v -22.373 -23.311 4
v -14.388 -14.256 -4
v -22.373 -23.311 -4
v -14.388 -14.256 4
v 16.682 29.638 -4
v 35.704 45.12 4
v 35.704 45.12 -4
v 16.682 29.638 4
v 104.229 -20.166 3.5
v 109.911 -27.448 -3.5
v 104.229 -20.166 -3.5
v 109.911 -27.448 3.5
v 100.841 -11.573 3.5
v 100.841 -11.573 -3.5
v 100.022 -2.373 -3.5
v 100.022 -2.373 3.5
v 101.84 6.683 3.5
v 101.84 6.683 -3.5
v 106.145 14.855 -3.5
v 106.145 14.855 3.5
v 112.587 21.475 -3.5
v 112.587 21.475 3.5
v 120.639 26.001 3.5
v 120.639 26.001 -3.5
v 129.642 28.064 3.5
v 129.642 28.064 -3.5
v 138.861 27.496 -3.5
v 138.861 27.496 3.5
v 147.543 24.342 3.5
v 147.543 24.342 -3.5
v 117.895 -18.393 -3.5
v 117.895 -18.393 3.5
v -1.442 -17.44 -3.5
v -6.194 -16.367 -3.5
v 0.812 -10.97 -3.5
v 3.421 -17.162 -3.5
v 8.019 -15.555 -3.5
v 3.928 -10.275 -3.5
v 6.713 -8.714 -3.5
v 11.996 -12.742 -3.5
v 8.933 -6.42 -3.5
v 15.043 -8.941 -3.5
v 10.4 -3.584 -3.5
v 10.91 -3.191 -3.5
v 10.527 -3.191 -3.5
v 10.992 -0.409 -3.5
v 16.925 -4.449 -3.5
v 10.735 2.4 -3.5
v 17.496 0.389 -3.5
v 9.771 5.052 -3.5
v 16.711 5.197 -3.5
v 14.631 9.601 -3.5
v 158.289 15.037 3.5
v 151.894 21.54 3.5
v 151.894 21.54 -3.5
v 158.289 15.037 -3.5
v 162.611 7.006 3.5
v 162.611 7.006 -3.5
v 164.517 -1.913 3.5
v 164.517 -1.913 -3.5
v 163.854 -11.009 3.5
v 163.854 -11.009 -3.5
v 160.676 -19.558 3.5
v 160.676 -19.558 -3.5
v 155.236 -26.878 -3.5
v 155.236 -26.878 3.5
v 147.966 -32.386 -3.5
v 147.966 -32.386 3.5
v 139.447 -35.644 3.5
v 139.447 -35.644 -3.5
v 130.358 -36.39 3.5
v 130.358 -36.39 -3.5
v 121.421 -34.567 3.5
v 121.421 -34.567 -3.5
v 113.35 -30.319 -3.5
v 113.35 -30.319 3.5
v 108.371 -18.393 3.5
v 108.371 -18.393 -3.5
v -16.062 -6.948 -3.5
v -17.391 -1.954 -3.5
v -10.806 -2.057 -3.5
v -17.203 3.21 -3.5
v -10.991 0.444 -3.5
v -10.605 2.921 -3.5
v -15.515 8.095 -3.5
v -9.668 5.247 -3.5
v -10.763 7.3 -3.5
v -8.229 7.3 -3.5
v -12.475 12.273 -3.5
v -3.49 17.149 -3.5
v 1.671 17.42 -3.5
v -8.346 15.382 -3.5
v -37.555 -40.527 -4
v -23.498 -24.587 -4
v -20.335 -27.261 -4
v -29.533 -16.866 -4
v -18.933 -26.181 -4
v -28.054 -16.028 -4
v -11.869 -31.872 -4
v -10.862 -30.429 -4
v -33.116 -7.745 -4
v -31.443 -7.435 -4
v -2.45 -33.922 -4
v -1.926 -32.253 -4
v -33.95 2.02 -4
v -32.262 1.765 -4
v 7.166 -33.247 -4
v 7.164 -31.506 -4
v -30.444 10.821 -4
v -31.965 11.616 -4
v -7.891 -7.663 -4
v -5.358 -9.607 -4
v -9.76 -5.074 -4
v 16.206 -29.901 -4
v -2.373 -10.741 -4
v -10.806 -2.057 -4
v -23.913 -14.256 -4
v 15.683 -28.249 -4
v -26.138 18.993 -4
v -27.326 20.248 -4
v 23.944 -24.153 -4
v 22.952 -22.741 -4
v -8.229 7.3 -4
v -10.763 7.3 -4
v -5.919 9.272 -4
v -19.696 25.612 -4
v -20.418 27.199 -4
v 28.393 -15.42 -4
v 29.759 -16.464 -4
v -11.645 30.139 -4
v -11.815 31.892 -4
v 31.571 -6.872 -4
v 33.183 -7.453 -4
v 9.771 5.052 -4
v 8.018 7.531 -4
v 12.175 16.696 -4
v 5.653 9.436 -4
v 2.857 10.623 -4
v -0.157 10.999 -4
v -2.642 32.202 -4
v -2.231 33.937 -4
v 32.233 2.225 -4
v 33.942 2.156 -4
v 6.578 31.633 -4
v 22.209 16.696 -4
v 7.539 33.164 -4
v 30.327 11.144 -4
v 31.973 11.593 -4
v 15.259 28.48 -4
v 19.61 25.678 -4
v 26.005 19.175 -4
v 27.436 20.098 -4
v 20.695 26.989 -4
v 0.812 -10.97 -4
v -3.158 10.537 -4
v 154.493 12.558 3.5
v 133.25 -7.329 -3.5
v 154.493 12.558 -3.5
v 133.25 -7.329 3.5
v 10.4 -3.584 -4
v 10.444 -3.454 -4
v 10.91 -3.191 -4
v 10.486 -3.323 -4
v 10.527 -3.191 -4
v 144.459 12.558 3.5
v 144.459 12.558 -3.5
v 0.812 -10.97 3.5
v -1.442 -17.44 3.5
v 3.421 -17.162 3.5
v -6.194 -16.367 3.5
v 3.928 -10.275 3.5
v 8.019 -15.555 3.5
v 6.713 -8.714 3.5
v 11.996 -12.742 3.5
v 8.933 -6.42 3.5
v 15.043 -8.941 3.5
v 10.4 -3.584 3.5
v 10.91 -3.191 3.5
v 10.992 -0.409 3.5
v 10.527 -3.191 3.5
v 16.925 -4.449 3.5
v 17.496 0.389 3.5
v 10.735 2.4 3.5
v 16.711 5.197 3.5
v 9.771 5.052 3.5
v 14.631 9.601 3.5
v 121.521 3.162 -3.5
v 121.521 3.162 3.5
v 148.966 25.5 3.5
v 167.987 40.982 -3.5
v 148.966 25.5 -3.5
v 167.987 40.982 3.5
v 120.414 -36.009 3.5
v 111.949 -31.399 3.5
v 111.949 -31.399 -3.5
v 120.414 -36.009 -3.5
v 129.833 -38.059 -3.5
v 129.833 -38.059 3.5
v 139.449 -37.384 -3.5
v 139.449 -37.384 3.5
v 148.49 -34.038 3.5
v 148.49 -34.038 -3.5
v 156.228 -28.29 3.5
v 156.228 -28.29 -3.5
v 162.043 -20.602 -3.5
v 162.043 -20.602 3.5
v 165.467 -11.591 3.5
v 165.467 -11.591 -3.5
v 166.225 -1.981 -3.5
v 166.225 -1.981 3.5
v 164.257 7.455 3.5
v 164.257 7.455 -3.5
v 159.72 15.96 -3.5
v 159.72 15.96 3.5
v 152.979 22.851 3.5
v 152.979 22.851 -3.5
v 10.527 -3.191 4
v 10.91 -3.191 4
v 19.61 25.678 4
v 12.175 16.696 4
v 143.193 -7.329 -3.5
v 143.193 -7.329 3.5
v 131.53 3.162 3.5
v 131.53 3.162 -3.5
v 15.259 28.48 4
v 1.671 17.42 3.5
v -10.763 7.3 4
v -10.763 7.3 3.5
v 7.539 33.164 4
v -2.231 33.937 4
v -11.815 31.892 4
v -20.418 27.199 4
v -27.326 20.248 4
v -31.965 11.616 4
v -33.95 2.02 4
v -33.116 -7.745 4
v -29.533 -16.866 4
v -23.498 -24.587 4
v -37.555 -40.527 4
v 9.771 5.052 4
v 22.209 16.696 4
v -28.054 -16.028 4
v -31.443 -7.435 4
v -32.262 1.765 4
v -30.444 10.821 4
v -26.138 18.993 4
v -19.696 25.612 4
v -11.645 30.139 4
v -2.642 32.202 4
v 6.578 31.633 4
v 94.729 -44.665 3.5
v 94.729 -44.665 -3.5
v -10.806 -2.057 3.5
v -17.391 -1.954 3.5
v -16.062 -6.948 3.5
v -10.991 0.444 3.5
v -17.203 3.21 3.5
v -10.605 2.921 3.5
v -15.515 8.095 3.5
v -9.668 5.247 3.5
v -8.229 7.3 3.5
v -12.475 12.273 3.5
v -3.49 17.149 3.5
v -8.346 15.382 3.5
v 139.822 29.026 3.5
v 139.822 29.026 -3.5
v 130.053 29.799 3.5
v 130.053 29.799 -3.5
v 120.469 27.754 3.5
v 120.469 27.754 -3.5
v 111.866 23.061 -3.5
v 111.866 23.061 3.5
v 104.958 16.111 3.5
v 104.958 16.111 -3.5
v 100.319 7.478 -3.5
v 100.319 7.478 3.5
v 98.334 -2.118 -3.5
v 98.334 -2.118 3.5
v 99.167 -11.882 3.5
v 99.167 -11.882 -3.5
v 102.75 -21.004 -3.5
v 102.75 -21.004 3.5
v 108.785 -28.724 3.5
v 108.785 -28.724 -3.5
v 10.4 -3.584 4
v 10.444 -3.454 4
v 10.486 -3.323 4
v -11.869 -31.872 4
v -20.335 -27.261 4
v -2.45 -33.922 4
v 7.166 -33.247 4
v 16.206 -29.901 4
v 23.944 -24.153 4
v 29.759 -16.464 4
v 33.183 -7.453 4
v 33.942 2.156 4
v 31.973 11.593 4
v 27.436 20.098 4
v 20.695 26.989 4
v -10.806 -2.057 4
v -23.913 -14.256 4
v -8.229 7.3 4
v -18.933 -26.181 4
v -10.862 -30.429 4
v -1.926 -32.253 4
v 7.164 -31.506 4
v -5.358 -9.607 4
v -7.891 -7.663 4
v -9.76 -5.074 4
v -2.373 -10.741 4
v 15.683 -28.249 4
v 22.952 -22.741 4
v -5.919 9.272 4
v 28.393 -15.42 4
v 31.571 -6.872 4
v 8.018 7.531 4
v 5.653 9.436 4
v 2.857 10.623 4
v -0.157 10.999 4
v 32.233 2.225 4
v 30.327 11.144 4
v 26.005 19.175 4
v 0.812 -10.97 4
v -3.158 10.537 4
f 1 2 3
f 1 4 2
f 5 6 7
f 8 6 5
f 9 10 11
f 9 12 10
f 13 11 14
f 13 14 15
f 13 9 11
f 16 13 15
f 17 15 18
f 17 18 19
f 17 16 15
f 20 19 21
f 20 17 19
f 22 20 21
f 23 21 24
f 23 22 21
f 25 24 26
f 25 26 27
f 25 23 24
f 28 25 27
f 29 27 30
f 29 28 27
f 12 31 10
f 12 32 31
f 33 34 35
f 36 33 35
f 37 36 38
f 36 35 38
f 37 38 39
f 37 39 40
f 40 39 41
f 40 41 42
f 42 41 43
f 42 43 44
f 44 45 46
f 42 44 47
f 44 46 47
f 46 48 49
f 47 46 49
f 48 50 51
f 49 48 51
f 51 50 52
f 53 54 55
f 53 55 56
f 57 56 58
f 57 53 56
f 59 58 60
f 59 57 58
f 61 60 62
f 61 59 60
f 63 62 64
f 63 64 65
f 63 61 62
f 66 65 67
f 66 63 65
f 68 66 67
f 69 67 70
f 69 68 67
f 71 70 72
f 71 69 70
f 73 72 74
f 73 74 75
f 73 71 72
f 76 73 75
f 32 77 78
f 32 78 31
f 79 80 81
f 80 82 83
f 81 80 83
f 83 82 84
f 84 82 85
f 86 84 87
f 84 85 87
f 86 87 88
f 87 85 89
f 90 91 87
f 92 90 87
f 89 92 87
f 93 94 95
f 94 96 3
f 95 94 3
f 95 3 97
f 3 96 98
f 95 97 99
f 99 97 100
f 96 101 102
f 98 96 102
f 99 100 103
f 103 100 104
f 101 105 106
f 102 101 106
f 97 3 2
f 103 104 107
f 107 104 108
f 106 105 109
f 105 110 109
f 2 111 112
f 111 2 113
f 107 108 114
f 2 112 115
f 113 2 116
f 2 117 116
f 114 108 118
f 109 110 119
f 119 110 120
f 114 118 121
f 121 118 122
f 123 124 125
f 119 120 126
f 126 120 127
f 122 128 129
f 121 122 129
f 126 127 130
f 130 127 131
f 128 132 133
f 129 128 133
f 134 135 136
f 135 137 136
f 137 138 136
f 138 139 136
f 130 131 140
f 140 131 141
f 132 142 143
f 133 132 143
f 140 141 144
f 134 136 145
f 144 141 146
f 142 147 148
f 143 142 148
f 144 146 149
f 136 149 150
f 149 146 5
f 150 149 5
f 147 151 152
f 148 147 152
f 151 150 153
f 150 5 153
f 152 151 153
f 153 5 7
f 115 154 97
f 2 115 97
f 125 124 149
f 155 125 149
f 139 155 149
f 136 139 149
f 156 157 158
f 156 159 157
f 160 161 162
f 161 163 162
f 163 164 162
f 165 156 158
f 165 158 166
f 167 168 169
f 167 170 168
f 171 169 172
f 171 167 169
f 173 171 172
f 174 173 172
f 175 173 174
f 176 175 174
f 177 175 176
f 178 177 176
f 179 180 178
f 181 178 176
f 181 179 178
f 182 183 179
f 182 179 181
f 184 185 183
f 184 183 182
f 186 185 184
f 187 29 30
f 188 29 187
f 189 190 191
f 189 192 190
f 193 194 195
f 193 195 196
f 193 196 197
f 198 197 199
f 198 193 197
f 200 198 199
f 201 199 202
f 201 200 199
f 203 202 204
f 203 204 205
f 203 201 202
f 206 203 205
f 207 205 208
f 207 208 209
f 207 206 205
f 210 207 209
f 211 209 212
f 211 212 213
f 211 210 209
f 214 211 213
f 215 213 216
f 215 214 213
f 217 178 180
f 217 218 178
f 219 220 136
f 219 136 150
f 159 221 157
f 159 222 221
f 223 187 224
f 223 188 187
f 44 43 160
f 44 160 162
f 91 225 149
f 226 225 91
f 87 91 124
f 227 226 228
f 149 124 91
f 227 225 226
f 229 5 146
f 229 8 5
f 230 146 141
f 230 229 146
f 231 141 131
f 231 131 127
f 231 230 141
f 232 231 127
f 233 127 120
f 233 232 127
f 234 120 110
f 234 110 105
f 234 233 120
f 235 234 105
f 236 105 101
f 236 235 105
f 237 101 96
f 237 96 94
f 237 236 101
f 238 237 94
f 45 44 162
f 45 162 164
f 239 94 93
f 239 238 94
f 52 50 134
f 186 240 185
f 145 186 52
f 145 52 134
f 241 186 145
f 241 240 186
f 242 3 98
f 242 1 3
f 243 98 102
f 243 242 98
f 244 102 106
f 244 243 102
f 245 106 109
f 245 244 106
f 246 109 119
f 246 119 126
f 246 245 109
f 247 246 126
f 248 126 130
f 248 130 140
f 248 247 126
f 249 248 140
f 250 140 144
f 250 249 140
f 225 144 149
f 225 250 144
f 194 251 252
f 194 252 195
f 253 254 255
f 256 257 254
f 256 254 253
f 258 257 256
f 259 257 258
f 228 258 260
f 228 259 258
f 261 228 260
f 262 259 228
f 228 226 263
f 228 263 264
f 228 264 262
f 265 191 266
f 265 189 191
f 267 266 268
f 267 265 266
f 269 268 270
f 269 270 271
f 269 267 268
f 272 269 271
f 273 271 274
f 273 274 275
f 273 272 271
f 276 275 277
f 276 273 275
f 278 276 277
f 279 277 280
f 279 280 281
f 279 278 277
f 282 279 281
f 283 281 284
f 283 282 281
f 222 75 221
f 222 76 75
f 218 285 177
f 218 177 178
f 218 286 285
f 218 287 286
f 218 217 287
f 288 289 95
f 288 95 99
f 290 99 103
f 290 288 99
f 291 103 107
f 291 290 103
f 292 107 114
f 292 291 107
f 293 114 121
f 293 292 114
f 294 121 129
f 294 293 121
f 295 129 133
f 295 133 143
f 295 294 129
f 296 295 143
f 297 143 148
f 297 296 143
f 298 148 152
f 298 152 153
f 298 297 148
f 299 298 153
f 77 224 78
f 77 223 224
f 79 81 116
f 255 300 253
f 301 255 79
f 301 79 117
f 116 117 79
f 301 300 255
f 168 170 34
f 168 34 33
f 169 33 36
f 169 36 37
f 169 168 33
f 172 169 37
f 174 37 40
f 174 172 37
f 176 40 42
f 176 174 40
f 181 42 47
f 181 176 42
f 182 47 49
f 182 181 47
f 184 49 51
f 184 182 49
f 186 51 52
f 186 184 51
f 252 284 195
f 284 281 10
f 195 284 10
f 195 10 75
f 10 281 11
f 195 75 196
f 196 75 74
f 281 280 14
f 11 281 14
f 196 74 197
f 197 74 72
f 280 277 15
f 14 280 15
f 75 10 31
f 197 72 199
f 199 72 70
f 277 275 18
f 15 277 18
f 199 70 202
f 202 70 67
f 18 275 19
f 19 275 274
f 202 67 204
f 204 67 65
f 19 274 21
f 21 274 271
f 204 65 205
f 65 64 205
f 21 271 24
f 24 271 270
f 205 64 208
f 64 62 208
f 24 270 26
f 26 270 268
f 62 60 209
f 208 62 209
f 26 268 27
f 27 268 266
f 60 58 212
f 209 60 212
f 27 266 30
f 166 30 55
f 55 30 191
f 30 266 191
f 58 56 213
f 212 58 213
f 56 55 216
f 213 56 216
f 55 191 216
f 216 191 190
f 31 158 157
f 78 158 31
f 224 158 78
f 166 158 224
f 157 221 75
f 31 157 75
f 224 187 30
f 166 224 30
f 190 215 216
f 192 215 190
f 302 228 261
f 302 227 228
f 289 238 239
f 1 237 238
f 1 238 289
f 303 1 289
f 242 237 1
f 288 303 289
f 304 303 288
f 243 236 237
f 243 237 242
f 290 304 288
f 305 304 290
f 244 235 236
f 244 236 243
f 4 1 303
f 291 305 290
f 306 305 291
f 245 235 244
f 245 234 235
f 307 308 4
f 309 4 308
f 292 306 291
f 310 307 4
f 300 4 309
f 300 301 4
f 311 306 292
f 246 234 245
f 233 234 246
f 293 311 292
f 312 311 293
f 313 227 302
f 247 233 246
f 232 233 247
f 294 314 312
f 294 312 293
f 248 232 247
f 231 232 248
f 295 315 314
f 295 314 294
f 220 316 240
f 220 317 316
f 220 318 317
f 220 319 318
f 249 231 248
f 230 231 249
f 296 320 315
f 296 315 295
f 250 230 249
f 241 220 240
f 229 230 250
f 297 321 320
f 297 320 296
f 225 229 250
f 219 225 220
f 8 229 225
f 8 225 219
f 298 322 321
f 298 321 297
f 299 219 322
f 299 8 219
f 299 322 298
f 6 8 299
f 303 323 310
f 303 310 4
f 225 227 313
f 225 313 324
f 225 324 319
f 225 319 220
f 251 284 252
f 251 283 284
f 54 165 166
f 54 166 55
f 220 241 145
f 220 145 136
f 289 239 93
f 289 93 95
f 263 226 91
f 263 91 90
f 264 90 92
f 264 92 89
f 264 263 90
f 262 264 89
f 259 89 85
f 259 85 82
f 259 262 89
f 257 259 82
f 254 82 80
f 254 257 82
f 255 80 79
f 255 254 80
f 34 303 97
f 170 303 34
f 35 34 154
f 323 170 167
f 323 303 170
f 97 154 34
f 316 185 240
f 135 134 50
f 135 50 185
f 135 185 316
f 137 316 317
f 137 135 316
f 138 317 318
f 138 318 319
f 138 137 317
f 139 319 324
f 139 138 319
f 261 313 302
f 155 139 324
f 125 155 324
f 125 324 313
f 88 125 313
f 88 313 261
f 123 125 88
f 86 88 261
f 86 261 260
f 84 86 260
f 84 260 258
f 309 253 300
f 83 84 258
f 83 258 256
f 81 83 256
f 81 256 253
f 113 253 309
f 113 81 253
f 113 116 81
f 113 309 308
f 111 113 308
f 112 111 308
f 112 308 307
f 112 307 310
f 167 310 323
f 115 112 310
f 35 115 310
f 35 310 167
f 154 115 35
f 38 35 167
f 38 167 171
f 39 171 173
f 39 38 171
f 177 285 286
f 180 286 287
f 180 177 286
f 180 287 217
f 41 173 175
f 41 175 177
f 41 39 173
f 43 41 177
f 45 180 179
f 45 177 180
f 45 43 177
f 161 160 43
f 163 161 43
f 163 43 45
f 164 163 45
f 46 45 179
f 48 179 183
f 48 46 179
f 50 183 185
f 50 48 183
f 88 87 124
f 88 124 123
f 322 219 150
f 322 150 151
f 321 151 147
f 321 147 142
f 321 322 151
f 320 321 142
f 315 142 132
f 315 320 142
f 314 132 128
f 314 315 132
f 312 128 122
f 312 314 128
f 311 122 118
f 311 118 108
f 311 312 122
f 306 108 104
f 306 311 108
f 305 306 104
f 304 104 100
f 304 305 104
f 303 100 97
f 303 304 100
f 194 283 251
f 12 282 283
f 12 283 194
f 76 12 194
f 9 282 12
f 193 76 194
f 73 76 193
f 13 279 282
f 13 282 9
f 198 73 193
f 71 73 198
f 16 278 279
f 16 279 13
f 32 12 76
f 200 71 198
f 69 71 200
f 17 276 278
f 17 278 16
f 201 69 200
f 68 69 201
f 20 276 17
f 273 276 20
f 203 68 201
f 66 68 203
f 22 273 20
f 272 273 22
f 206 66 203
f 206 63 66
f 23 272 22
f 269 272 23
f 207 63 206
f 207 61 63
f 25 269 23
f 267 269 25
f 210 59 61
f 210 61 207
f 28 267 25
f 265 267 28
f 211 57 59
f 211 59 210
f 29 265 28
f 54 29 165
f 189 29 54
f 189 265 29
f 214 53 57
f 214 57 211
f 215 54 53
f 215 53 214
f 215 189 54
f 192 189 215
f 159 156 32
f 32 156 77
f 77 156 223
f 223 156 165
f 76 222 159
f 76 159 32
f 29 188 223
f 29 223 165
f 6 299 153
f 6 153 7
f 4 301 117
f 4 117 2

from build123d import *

# Parameters (mm, degrees)
F1_DEPTH = 4
F3_DEPTH = 3.5
F0_R     = 17.5
F0_R_2   = 11
F4_DEPTH = 12.5


with BuildPart() as f1:
    # F0 (on Top) → F1 (new body, symmetric)
    with BuildSketch(Plane.XY):
        with BuildLine():
            Line((108.7852449225, -28.7244588639), (94.7288274765, -44.6647256613))
            Line((94.7288274765, -44.6647256613), (111.948788965, -31.3989787612))
            ThreePointArc((111.948788965, -31.3989787612), (159.4091762592, -24.6532280154), (152.9788344756, 22.8509214853))
            Line((152.9788344756, 22.8509214853), (167.9873764515, 40.9821607172))
            Line((167.9873764515, 40.9821607172), (148.9655762499, 25.4999380126))
            ThreePointArc((148.9655762499, 25.4999380126), (104.9580490458, 16.1105279599), (108.7852449225, -28.7244588639))
        make_face()
        with BuildLine():
            Line((154.493033886, 12.5583419576), (144.4589197636, 12.5583419576))
            Line((144.4589197636, 12.5583419576), (151.894032038, 21.5404136059))
            ThreePointArc((151.894032038, 21.5404136059), (158.2156540419, -23.4112108102), (113.3504015781, -30.3192180319))
            Line((113.3504015781, -30.3192180319), (143.1933492422, -7.3290974833))
            Line((143.1933492422, -7.3290974833), (133.2496255636, -7.3290974833))
            Line((133.2496255636, -7.3290974833), (154.493033886, 12.5583419576))
        make_face(mode=Mode.SUBTRACT)
        with BuildLine():
            Line((108.3709695976, -18.3933340013), (117.8954188988, -18.3933340013))
            Line((117.8954188988, -18.3933340013), (109.910569413, -27.4483177218))
            ThreePointArc((109.910569413, -27.4483177218), (106.1453531249, 14.8550560972), (147.5428330502, 24.3419389359))
            Line((147.5428330502, 24.3419389359), (121.5210035443, 3.1622527167))
            Line((121.5210035443, 3.1622527167), (131.5303295851, 3.1622527167))
            Line((131.5303295851, 3.1622527167), (108.3709695976, -18.3933340013))
        make_face(mode=Mode.SUBTRACT)
    extrude(amount=F1_DEPTH, both=True)


with BuildPart() as f1_1:
    # F2: moved
    add(f1.part.moved(Location((-132.2836276846, 4.137752642, 0))))

    # F0 (on Top) → F3, piece 2 (join, symmetric)
    with BuildSketch(Plane.XY):
        Circle(F0_R)
        Circle(F0_R_2, mode=Mode.SUBTRACT)
    extrude(amount=F3_DEPTH, both=True)

    # F0 (on Top) → F4 (cut, symmetric)
    with BuildSketch(Plane.XY):
        Circle(F0_R_2)
    extrude(amount=F4_DEPTH, both=True, mode=Mode.SUBTRACT)


with BuildPart() as f3:
    # F0 (on Top) → F3 (new body, symmetric)
    with BuildSketch(Plane.XY):
        with BuildLine():
            Line((108.7852449225, -28.7244588639), (94.7288274765, -44.6647256613))
            Line((94.7288274765, -44.6647256613), (111.948788965, -31.3989787612))
            ThreePointArc((111.948788965, -31.3989787612), (159.4091762592, -24.6532280154), (152.9788344756, 22.8509214853))
            Line((152.9788344756, 22.8509214853), (167.9873764515, 40.9821607172))
            Line((167.9873764515, 40.9821607172), (148.9655762499, 25.4999380126))
            ThreePointArc((148.9655762499, 25.4999380126), (104.9580490458, 16.1105279599), (108.7852449225, -28.7244588639))
        make_face()
        with BuildLine():
            Line((154.493033886, 12.5583419576), (144.4589197636, 12.5583419576))
            Line((144.4589197636, 12.5583419576), (151.894032038, 21.5404136059))
            ThreePointArc((151.894032038, 21.5404136059), (158.2156540419, -23.4112108102), (113.3504015781, -30.3192180319))
            Line((113.3504015781, -30.3192180319), (143.1933492422, -7.3290974833))
            Line((143.1933492422, -7.3290974833), (133.2496255636, -7.3290974833))
            Line((133.2496255636, -7.3290974833), (154.493033886, 12.5583419576))
        make_face(mode=Mode.SUBTRACT)
        with BuildLine():
            Line((108.3709695976, -18.3933340013), (117.8954188988, -18.3933340013))
            Line((117.8954188988, -18.3933340013), (109.910569413, -27.4483177218))
            ThreePointArc((109.910569413, -27.4483177218), (106.1453531249, 14.8550560972), (147.5428330502, 24.3419389359))
            Line((147.5428330502, 24.3419389359), (121.5210035443, 3.1622527167))
            Line((121.5210035443, 3.1622527167), (131.5303295851, 3.1622527167))
            Line((131.5303295851, 3.1622527167), (108.3709695976, -18.3933340013))
        make_face(mode=Mode.SUBTRACT)
    extrude(amount=F3_DEPTH, both=True)


solid = Compound([f1_1.part, f3.part])
